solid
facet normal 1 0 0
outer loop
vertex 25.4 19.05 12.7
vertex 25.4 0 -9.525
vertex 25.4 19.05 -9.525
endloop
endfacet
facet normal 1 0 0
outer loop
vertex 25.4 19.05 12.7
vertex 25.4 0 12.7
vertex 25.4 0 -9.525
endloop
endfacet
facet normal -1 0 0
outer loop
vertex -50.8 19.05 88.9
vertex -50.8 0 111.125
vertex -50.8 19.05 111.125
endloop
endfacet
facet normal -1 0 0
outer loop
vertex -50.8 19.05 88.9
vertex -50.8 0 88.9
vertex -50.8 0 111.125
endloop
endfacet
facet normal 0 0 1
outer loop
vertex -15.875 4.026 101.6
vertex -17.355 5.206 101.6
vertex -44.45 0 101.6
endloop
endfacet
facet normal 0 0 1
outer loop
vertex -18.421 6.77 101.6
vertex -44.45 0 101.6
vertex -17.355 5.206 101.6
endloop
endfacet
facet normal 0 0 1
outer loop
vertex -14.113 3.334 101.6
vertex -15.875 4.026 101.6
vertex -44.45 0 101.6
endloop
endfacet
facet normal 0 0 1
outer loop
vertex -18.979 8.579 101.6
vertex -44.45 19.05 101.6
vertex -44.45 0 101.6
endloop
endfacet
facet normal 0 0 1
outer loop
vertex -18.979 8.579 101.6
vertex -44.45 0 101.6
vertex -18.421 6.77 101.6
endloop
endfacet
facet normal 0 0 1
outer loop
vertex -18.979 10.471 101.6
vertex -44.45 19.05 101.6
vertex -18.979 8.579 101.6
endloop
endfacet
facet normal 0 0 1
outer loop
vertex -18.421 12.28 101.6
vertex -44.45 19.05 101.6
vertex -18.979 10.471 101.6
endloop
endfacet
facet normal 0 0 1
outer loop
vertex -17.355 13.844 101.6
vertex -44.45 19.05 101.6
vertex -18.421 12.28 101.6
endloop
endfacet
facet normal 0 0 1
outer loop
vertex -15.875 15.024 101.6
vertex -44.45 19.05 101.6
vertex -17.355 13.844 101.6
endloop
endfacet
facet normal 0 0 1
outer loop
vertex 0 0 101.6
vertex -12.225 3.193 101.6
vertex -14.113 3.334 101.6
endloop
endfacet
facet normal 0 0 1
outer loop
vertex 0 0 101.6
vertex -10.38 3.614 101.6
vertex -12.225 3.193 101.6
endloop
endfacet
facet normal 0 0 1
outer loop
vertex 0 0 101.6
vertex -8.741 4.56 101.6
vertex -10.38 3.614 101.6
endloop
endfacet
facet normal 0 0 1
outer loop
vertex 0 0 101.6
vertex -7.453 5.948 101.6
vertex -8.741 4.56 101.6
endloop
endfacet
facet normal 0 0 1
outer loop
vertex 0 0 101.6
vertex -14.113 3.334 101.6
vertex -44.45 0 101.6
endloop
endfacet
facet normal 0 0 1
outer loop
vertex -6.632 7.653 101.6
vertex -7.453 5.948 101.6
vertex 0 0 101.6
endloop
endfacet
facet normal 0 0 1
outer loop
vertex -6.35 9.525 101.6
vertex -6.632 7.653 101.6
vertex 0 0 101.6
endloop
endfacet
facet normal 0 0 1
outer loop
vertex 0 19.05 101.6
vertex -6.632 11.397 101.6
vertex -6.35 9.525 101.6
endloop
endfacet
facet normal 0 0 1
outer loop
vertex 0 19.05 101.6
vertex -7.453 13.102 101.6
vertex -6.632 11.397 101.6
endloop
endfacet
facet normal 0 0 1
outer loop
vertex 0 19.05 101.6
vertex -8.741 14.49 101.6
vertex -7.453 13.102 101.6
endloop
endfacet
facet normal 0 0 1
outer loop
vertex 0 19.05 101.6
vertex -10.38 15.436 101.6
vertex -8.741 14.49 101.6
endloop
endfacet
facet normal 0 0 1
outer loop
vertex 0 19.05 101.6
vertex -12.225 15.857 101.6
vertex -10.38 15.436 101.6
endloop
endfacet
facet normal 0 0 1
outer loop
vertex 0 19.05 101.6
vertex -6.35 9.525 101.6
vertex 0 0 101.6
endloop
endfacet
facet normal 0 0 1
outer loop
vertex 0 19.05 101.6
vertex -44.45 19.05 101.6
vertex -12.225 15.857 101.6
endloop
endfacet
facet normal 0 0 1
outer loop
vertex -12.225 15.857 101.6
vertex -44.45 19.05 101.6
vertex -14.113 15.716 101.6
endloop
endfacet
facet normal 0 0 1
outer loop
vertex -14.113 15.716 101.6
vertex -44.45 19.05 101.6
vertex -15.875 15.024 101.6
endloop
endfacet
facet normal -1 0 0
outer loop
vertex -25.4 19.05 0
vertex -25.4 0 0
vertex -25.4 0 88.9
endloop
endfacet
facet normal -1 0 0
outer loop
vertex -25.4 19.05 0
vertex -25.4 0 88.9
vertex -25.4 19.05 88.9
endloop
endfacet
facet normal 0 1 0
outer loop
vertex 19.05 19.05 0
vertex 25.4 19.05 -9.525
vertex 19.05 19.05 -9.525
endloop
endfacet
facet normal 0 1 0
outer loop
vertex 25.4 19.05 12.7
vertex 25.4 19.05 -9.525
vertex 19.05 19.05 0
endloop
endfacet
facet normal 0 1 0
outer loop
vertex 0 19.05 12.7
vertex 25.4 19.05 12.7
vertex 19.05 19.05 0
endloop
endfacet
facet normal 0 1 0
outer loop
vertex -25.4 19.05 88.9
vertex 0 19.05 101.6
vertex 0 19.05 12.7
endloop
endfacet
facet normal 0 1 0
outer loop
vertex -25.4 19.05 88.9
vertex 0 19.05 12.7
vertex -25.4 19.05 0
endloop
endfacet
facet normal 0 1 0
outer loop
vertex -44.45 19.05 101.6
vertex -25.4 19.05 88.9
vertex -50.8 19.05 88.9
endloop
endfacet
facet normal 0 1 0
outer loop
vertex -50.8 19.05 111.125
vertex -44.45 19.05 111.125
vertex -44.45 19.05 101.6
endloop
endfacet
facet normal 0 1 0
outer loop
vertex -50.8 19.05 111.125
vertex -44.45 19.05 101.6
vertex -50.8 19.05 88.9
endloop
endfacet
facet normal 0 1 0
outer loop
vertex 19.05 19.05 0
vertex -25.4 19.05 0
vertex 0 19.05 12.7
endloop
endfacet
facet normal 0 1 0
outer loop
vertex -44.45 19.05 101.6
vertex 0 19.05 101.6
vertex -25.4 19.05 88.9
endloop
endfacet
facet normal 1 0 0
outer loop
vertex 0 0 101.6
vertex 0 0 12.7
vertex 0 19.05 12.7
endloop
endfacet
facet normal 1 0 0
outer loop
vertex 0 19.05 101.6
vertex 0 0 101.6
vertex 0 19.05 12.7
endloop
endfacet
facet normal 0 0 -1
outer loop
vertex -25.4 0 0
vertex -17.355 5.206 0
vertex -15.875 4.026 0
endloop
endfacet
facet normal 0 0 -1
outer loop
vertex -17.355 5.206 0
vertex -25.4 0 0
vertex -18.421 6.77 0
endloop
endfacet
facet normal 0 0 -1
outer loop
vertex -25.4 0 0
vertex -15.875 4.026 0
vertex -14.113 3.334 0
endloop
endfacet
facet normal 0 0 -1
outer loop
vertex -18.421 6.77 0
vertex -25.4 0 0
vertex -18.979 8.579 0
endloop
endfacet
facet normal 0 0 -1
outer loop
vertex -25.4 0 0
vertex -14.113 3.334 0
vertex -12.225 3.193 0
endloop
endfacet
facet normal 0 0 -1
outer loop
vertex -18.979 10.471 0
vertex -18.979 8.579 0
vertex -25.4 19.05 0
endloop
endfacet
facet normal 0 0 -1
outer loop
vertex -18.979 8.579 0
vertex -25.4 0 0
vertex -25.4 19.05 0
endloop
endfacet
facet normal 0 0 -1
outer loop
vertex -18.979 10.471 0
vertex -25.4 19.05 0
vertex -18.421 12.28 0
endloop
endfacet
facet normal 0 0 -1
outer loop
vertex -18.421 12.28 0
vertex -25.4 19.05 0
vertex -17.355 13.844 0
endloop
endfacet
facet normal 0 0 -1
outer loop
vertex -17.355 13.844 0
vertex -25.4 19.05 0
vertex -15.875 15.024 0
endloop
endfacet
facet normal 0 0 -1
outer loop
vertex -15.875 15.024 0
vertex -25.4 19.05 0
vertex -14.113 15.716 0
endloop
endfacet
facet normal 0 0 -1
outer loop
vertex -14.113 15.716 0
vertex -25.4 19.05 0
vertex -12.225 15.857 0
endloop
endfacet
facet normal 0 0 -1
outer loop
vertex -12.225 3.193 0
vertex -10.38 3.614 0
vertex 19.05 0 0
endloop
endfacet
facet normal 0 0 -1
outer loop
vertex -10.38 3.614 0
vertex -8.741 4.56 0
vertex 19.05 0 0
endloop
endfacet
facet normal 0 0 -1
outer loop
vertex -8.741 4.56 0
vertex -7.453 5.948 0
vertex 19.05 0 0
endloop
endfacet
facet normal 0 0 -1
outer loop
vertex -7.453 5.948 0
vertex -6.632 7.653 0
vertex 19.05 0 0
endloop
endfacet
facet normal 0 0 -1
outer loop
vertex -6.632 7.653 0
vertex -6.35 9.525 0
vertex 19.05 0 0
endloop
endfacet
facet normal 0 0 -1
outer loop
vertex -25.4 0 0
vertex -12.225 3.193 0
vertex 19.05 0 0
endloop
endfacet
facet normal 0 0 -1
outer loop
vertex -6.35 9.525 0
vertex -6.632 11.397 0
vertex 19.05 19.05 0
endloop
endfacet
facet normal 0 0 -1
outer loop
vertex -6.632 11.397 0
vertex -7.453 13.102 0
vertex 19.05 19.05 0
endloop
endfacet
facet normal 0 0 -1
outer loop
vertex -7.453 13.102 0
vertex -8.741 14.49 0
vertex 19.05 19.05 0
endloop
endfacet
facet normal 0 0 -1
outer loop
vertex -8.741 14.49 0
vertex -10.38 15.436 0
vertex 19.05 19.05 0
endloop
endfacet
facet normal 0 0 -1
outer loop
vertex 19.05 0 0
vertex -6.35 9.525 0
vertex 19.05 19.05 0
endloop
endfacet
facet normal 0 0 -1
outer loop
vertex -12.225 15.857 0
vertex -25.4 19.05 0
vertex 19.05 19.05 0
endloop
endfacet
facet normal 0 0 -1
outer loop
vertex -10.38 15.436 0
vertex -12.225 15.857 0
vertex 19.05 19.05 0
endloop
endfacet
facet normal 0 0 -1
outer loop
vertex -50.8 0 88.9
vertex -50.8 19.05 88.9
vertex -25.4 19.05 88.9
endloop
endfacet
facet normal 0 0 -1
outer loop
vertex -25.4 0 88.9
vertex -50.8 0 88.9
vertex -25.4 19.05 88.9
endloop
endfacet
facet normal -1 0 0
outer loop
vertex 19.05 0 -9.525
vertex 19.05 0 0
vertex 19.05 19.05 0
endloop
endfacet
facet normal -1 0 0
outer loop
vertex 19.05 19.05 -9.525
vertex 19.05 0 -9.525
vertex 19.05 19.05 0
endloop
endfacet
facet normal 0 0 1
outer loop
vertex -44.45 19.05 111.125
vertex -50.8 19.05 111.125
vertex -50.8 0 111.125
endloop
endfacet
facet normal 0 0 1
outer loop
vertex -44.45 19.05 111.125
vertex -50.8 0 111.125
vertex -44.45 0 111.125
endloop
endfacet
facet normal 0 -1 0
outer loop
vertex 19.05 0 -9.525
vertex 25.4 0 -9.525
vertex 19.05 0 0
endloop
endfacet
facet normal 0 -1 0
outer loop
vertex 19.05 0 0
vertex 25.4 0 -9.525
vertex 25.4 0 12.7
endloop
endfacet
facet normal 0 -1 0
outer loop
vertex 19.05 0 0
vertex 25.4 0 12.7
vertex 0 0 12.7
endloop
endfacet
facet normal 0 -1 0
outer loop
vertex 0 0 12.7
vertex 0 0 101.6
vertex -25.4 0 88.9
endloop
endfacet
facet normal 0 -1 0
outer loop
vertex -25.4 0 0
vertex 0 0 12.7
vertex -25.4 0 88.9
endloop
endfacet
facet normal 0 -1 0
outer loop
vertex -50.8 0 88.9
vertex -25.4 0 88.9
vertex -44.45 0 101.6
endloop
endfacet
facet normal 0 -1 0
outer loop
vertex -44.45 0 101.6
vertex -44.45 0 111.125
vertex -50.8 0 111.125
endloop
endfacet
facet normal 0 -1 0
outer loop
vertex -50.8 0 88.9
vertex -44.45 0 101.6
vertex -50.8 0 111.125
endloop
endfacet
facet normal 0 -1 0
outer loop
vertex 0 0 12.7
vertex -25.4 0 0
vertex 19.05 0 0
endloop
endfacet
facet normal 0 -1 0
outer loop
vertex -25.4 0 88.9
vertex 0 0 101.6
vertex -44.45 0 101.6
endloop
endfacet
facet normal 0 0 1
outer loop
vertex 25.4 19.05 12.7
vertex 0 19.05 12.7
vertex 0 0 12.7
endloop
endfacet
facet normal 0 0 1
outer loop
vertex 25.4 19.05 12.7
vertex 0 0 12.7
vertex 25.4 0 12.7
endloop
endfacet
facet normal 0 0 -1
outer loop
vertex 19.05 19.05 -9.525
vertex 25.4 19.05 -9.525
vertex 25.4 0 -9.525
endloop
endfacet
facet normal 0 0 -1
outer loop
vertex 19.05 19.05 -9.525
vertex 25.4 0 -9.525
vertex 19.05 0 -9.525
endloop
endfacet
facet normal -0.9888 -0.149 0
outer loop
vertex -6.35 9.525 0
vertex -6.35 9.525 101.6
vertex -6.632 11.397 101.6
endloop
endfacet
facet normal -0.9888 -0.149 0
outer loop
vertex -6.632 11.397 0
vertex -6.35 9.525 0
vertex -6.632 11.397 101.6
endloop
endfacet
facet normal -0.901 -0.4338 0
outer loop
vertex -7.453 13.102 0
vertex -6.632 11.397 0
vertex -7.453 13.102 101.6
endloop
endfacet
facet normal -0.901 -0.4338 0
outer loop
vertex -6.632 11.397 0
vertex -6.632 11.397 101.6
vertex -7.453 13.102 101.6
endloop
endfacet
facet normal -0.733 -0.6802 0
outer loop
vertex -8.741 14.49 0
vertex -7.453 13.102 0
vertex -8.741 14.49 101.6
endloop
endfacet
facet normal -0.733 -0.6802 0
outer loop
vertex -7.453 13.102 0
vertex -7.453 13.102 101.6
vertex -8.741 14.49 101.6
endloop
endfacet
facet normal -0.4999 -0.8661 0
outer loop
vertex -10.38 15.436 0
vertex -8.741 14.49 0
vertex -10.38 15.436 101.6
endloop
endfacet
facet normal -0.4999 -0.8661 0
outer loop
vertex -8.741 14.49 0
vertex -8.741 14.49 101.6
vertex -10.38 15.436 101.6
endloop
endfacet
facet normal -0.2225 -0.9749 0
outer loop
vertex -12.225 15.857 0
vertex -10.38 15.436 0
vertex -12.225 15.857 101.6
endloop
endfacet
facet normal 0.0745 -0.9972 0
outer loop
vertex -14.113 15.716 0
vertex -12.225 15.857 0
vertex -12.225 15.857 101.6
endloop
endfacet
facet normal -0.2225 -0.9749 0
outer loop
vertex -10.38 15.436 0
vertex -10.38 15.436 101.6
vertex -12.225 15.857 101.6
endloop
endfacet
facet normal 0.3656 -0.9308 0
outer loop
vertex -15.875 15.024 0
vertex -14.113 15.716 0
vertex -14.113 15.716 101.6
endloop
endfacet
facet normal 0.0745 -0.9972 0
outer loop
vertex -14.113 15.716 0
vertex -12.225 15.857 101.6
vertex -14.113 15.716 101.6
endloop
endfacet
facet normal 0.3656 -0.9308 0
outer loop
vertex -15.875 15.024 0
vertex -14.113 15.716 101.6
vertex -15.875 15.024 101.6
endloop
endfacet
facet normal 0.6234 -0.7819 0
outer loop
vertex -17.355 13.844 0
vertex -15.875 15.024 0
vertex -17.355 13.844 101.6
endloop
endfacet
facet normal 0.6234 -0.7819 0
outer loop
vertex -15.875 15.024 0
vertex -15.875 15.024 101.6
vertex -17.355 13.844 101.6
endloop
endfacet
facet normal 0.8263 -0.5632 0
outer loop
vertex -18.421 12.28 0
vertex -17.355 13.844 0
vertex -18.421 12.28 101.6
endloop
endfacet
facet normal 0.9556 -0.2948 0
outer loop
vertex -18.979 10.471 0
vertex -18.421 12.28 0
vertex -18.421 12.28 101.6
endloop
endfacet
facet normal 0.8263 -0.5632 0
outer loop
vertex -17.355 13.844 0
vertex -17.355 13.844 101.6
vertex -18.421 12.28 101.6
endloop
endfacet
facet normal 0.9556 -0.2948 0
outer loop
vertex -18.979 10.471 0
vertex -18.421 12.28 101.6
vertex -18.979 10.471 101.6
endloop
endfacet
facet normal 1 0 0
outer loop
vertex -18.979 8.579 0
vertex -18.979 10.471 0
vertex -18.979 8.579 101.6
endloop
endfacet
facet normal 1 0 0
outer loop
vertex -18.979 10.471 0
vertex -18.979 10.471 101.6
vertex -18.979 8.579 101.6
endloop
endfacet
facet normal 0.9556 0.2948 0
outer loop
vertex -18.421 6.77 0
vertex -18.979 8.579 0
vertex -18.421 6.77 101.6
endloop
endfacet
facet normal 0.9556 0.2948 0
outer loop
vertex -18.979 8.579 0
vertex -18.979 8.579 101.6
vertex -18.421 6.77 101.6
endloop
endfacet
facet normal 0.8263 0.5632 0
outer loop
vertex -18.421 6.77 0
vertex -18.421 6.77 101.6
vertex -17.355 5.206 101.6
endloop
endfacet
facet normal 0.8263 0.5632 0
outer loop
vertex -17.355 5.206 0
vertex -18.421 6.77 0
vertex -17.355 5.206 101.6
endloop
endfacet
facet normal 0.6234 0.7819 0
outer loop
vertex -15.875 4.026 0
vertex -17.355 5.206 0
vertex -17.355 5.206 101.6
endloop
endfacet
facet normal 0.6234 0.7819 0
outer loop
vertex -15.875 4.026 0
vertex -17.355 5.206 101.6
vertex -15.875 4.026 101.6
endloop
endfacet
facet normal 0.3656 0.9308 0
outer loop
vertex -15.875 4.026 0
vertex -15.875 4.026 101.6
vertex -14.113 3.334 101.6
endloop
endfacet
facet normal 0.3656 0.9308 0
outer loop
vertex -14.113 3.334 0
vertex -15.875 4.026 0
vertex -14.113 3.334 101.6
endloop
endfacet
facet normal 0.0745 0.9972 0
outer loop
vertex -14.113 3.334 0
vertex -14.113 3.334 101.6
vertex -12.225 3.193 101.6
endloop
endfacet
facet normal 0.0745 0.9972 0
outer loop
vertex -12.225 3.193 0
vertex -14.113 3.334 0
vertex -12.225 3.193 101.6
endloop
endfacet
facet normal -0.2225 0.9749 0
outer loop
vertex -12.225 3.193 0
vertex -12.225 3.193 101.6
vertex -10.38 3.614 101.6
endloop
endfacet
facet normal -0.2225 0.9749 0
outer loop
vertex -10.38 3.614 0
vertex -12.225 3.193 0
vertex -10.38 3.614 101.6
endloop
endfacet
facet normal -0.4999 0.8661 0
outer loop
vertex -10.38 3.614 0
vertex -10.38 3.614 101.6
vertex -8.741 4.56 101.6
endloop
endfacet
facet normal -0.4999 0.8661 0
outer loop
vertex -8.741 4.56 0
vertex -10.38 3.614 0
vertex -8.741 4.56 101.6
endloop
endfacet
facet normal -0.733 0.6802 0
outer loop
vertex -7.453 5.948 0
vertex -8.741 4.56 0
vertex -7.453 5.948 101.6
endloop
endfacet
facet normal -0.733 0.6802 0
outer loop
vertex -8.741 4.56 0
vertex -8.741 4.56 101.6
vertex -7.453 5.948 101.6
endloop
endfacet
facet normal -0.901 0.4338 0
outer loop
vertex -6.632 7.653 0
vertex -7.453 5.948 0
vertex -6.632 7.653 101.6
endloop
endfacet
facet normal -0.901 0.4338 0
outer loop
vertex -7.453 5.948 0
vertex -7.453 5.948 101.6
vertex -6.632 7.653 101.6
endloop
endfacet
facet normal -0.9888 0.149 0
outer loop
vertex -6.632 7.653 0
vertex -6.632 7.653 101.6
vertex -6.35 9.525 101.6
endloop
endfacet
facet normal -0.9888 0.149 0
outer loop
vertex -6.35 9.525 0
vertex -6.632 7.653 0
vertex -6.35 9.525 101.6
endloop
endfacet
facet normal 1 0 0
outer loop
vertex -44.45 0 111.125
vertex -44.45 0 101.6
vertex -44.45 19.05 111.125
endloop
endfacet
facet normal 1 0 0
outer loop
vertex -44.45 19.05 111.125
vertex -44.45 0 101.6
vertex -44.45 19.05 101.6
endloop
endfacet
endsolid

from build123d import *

# Parameters (mm, degrees)
SKETCH1_W           = 25.4
SKETCH1_H           = 19.05
BOSS_EXTRUDE1_DEPTH = 101.6
SKETCH2_R           = 6.35
CUT_EXTRUDE1_DEPTH  = 101.6
SKETCH3_W           = 25.4
SKETCH3_H           = 12.7
BOSS_EXTRUDE2_DEPTH = 19.05
SKETCH5_W           = 6.35
SKETCH5_H           = 19.05
BOSS_EXTRUDE4_DEPTH = 9.525
SKETCH8_W           = 25.4
SKETCH8_H           = 12.7
BOSS_EXTRUDE5_DEPTH = 19.05
SKETCH9_W           = 6.35
SKETCH9_H           = 19.05
BOSS_EXTRUDE6_DEPTH = 9.525


with BuildPart() as part:
    # Sketch1 → Boss-Extrude1 (new body)
    with BuildSketch(Plane.XY):
        with Locations((-12.7, 9.525)):
            Rectangle(SKETCH1_W, SKETCH1_H)
    extrude(amount=BOSS_EXTRUDE1_DEPTH)

    # Sketch2 → Cut-Extrude1 (cut)
    with BuildSketch(Plane.XY.offset(101.6)):
        with Locations((-12.7, 9.525)):
            Circle(SKETCH2_R)
    extrude(amount=-CUT_EXTRUDE1_DEPTH, mode=Mode.SUBTRACT)

    # Sketch3 → Boss-Extrude2 (add)
    with BuildSketch(Plane(origin=(0, 19.05, 0), x_dir=(1, 0, 0), z_dir=(0, 1, 0))):
        with Locations((-38.1, -95.25)):
            Rectangle(SKETCH3_W, SKETCH3_H)
    extrude(amount=-BOSS_EXTRUDE2_DEPTH)

    # Sketch5 → Boss-Extrude4 (add)
    with BuildSketch(Plane.XY.offset(101.6)):
        with Locations((-47.625, 9.525)):
            Rectangle(SKETCH5_W, SKETCH5_H)
    extrude(amount=BOSS_EXTRUDE4_DEPTH)

    # Sketch8 → Boss-Extrude5 (add)
    with BuildSketch(Plane(origin=(0, 19.05, 0), x_dir=(1, 0, 0), z_dir=(0, 1, 0))):
        with Locations((12.7, -6.35)):
            Rectangle(SKETCH8_W, SKETCH8_H)
    extrude(amount=-BOSS_EXTRUDE5_DEPTH)

    # Sketch9 → Boss-Extrude6 (add)
    with BuildSketch(Plane(origin=(0, 0, 0), x_dir=(-1, 0, 0), z_dir=(0, 0, -1))):
        with Locations((-22.225, 9.525)):
            Rectangle(SKETCH9_W, SKETCH9_H)
    extrude(amount=BOSS_EXTRUDE6_DEPTH)


solid = part.part
